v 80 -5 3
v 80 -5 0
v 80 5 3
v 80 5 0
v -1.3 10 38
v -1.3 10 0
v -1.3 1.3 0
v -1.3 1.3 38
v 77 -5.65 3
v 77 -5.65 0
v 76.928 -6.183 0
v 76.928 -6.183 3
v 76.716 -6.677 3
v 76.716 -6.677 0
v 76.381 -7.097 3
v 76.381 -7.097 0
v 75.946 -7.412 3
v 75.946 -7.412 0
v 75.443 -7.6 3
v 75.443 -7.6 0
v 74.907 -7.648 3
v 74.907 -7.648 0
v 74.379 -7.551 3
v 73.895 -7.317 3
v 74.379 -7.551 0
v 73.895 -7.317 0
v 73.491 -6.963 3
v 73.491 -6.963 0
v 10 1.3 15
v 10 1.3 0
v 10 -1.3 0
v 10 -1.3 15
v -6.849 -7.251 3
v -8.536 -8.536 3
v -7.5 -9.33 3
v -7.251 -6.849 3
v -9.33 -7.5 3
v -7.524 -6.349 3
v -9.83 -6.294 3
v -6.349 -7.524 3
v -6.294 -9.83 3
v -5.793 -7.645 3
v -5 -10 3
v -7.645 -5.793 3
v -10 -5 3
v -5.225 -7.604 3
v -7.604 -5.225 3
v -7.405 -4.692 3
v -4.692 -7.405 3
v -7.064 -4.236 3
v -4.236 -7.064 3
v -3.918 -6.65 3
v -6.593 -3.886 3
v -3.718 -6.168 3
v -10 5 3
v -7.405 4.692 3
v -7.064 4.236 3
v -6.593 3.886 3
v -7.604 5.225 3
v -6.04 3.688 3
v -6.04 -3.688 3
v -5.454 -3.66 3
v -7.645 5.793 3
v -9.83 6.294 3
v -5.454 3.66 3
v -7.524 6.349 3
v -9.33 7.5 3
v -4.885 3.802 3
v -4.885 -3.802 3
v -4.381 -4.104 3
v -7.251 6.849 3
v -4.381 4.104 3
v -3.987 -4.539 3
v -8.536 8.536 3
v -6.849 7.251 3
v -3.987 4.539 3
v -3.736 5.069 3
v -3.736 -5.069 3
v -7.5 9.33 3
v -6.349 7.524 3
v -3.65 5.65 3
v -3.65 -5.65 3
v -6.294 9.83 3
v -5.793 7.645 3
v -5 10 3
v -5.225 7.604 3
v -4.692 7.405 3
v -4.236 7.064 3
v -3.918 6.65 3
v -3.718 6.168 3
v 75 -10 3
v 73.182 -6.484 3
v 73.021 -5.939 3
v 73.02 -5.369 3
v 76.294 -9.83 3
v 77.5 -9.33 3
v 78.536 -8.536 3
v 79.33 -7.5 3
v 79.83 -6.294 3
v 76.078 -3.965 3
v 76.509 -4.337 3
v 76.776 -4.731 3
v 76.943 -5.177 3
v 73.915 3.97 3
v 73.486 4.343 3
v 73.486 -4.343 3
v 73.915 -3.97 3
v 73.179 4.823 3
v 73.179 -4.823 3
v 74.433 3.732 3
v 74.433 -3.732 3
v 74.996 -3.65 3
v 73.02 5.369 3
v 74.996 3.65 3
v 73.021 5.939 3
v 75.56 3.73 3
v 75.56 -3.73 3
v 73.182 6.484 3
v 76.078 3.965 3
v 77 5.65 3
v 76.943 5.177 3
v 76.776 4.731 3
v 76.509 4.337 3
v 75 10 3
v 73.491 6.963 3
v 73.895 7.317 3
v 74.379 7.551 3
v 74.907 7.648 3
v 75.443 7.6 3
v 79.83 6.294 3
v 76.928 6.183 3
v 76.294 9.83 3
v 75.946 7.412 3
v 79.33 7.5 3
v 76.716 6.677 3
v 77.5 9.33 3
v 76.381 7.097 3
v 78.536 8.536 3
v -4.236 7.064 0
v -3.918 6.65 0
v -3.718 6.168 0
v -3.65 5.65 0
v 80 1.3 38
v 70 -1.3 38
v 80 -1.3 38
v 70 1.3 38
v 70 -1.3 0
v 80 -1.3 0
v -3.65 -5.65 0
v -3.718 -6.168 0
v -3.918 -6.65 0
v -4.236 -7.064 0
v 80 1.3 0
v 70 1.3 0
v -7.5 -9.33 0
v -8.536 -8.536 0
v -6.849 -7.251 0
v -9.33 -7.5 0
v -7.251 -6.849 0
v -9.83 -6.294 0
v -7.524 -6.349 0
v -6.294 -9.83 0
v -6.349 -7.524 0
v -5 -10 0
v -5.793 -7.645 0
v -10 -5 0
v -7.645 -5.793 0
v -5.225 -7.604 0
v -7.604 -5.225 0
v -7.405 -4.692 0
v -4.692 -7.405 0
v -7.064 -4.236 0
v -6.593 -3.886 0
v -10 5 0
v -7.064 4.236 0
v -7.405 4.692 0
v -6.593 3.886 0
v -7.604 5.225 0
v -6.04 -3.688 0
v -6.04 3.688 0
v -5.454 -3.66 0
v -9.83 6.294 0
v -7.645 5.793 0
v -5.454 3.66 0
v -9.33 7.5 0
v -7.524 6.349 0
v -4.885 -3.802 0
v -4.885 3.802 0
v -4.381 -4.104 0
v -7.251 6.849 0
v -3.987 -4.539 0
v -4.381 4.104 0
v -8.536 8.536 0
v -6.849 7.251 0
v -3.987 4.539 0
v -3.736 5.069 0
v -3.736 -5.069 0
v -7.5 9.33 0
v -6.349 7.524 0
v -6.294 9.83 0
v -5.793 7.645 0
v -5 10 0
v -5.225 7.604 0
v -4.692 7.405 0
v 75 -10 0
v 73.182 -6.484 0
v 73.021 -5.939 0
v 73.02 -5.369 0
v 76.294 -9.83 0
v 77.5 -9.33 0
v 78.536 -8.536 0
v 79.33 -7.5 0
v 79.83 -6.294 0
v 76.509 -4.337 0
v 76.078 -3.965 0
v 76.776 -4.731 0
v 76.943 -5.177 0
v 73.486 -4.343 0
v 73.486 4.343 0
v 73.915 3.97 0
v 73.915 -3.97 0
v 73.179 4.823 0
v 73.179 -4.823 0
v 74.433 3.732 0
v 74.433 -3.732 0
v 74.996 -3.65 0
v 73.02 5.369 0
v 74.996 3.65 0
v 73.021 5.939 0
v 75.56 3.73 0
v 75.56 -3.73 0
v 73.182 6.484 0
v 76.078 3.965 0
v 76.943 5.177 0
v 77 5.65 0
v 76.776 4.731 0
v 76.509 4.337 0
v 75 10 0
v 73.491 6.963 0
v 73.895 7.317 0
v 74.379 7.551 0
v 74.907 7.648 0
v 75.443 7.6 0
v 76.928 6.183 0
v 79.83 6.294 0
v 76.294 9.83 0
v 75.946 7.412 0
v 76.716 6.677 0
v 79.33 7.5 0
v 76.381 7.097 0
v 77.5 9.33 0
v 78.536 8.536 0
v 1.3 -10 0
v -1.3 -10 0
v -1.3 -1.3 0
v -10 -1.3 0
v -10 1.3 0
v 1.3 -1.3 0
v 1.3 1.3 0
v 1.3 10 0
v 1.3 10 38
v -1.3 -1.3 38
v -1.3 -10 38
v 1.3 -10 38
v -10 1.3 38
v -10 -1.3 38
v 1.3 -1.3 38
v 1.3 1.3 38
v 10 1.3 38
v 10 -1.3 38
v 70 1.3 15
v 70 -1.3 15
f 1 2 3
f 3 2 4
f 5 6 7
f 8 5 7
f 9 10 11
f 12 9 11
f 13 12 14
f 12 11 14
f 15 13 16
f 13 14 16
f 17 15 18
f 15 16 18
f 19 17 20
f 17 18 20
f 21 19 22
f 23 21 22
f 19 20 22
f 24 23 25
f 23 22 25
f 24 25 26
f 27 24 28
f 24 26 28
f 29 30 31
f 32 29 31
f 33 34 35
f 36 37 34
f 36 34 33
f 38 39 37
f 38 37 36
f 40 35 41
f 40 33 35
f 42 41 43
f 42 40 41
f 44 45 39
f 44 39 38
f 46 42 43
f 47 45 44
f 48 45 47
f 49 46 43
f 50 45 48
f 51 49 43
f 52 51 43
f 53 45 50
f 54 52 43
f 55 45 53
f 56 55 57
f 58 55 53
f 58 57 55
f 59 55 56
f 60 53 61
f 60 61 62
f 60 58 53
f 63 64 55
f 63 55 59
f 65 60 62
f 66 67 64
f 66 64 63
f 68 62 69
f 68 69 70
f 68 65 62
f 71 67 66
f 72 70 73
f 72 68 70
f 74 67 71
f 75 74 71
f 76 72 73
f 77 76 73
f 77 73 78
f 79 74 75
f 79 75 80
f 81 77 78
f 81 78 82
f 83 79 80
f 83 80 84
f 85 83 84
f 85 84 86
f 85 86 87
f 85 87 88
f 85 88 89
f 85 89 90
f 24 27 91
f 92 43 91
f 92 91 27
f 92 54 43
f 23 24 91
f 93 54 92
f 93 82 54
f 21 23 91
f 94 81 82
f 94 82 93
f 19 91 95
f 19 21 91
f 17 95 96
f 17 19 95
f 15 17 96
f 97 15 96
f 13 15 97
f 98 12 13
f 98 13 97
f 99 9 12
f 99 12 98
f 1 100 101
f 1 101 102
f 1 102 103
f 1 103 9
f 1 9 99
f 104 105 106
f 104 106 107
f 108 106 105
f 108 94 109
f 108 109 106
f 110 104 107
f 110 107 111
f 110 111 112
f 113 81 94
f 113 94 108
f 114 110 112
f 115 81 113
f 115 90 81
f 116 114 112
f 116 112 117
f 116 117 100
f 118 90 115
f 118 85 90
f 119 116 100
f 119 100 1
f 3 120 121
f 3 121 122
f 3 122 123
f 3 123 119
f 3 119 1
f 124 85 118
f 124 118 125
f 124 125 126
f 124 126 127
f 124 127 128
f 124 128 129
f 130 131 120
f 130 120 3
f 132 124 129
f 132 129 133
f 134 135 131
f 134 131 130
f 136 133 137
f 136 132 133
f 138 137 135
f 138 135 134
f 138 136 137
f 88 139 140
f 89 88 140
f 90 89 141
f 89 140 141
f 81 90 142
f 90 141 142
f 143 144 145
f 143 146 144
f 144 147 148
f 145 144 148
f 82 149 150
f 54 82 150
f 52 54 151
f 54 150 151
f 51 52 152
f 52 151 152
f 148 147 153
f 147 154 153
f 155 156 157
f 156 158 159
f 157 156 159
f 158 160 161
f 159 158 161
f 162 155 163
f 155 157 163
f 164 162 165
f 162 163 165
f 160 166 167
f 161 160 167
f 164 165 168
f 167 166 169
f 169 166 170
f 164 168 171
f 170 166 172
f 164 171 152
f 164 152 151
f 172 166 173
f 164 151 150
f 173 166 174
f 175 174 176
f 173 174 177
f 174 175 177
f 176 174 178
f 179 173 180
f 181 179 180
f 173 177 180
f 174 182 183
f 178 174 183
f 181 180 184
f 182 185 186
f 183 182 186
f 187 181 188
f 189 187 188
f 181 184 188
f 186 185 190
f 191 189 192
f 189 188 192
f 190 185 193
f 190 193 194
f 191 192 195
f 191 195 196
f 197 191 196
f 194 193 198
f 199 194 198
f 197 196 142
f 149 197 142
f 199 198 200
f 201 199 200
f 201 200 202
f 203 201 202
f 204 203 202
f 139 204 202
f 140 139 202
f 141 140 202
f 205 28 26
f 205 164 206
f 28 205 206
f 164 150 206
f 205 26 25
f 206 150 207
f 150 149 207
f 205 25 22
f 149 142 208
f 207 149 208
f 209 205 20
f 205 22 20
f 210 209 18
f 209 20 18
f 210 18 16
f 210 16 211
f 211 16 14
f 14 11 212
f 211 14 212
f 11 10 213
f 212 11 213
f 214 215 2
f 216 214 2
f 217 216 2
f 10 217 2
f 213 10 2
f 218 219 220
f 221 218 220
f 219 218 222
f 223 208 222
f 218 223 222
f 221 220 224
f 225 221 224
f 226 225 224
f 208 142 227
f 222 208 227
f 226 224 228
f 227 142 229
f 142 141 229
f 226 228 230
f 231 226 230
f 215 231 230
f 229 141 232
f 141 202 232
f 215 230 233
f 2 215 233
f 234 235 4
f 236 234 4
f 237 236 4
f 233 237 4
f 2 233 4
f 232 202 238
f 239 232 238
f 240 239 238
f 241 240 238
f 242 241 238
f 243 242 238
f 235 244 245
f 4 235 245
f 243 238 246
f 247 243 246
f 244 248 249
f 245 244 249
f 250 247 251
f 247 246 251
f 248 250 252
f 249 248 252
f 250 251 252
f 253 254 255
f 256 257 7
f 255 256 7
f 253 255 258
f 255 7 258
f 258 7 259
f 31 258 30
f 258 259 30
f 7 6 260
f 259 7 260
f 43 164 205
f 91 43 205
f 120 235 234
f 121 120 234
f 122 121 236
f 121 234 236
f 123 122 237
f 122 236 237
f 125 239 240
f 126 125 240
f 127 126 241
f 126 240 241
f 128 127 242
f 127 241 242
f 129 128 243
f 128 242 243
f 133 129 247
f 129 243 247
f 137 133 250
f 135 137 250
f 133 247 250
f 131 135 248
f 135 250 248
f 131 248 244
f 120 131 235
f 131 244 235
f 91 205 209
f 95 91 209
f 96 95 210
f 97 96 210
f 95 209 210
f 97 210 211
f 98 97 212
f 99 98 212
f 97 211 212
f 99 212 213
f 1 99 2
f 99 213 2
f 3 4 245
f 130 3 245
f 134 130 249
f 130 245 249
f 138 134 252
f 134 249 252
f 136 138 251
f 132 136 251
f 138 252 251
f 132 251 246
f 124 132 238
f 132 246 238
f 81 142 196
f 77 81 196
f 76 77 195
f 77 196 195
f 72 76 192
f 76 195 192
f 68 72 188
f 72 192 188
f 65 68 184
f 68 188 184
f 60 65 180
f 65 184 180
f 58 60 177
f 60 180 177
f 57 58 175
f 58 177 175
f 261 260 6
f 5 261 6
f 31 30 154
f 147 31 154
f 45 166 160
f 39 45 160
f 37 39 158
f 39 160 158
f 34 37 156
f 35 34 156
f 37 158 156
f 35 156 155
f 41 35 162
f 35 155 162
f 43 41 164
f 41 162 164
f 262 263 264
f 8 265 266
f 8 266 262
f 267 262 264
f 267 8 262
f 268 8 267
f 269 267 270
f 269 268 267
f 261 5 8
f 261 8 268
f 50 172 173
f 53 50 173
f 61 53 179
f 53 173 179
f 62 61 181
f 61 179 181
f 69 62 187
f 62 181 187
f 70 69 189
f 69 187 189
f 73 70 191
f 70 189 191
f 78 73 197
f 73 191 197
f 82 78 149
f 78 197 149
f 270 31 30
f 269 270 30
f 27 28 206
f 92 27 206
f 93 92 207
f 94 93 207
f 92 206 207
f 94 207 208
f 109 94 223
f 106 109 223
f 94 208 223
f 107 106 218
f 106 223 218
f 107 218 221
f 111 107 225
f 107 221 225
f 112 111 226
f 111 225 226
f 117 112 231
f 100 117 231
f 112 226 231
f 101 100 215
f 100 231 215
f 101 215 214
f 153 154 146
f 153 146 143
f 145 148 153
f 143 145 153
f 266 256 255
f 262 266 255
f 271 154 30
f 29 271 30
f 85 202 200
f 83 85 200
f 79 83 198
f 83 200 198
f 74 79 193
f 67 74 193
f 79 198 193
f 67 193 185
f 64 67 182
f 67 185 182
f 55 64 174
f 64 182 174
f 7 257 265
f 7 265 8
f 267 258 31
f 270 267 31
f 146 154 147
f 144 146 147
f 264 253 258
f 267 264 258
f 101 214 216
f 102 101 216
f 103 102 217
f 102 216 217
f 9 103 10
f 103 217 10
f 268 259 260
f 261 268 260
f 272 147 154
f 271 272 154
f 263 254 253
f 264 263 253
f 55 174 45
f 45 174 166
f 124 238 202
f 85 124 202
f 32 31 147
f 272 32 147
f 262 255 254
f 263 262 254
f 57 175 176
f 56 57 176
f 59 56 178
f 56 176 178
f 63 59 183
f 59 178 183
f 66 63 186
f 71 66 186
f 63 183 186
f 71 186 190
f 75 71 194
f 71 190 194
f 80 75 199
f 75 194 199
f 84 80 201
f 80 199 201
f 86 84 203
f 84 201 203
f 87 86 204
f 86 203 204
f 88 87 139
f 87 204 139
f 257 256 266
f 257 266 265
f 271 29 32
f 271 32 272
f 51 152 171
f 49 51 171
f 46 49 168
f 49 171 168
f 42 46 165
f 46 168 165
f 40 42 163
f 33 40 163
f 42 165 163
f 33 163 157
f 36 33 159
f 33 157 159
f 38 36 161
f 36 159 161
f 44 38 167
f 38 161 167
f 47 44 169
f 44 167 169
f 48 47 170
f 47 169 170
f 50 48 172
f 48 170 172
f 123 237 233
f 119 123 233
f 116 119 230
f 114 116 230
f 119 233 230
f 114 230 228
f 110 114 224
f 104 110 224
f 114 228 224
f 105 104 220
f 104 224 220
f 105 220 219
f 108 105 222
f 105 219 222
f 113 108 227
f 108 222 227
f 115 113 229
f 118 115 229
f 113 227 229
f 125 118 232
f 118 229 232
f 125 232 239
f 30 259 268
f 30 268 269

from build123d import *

# Parameters (mm, degrees)
F0_W     = 10
F0_H     = 1.3
F1_DEPTH = 38
F0_W_2   = 8.7
F0_H_2   = 2.6
F0_W_3   = 1.3
F0_W_4   = 18
F2_DEPTH = 3
F3_DEPTH = 15


with BuildPart() as f1:
    # F0 (on Top) → F1 (new body)
    with BuildSketch(Plane.XY):
        with Locations((75, -0.65)):
            Rectangle(F0_W, F0_H)
        with Locations((75, 0.65)):
            Rectangle(F0_W, F0_H)
    extrude(amount=F1_DEPTH)


with BuildPart() as f1b:
    # F0 (on Top) → F1, piece 2 (new body)
    with BuildSketch(Plane.XY):
        Polygon((0, 1.3), (1.3, 1.3), (1.3, 10), (-1.3, 10), (-1.3, 1.3), align=None)
        with Locations((-5.65, 0)):
            Rectangle(F0_W_2, F0_H_2)
        Polygon((1.3, -10), (1.3, -1.3), (0, -1.3), (-1.3, -1.3), (-1.3, -10), align=None)
        with Locations((5.65, -0.65)):
            Rectangle(F0_W_2, F0_H)
        with Locations((5.65, 0.65)):
            Rectangle(F0_W_2, F0_H)
        with Locations((0.65, -0.65)):
            Rectangle(F0_W_3, F0_H)
        with Locations((0.65, 0.65)):
            Rectangle(F0_W_3, F0_H)
        Polygon((0, 0), (0, 1.3), (-1.3, 1.3), (-1.3, -1.3), (0, -1.3), align=None)
    extrude(amount=F1_DEPTH)


with BuildPart() as f2:
    # F0 (on Top) → F2 (new body)
    with BuildSketch(Plane.XY):
        with BuildLine():
            Line((-7.0642135624, -4.2357864376), (-10, -1.3))
            Line((-10, -1.3), (-10, -5))
            ThreePointArc((-10, -5), (-8.5355339059, -8.5355339059), (-5, -10))
            Line((-5, -10), (-1.3, -10))
            Line((-1.3, -10), (-4.2357864376, -7.0642135624))
            ThreePointArc((-4.2357864376, -7.0642135624), (-7.0642135624, -7.0642135624), (-7.0642135624, -4.2357864376))
        make_face()
        with BuildLine():
            ThreePointArc((35.65, -3.3), (18.151339337, -4.9906352574), (1.3, -10))
            Line((1.3, -10), (70, -10))
            ThreePointArc((70, -10), (53.148660663, -4.9906352574), (35.65, -3.3))
        make_face()
        with BuildLine():
            Line((-4.2357864376, 7.0642135624), (-1.3, 10))
            Line((-1.3, 10), (-5, 10))
            ThreePointArc((-5, 10), (-8.5355339059, 8.5355339059), (-10, 5))
            Line((-10, 5), (-10, 1.3))
            Line((-10, 1.3), (-7.0642135624, 4.2357864376))
            ThreePointArc((-7.0642135624, 4.2357864376), (-7.0642135624, 7.0642135624), (-4.2357864376, 7.0642135624))
        make_face()
        with BuildLine():
            Line((70, 10), (1.3, 10))
            ThreePointArc((1.3, 10), (18.151339337, 4.9906352574), (35.65, 3.3))
            ThreePointArc((35.65, 3.3), (53.148660663, 4.9906352574), (70, 10))
        make_face()
        with Locations((-5.65, 0)):
            Rectangle(F0_W_2, F0_H_2)
        with Locations((75, 0.65)):
            Rectangle(F0_W, F0_H)
        with Locations((75, -0.65)):
            Rectangle(F0_W, F0_H)
        with BuildLine():
            Line((73.4911138428, -6.9627309567), (70, -10))
            Line((70, -10), (75, -10))
            ThreePointArc((75, -10), (78.5355339059, -8.5355339059), (80, -5))
            Line((80, -5), (80, -1.3))
            Line((80, -1.3), (76.5088861572, -4.3372690433))
            ThreePointArc((76.5088861572, -4.3372690433), (76.8732021133, -4.9492048496), (77, -5.65))
            ThreePointArc((77, -5.65), (75.7007951504, -7.5232021133), (73.4911138428, -6.9627309567))
        make_face()
        with BuildLine():
            Line((75, 10), (70, 10))
            Line((70, 10), (73.4911138428, 6.9627309567))
            ThreePointArc((73.4911138428, 6.9627309567), (75.7007951504, 7.5232021133), (77, 5.65))
            ThreePointArc((77, 5.65), (76.8732021133, 4.9492048496), (76.5088861572, 4.3372690433))
            Line((76.5088861572, 4.3372690433), (80, 1.3))
            Line((80, 1.3), (80, 5))
            ThreePointArc((80, 5), (78.5355339059, 8.5355339059), (75, 10))
        make_face()
        Polygon((0, 1.3), (1.3, 1.3), (1.3, 10), (-1.3, 10), (-1.3, 1.3), align=None)
        with BuildLine():
            Line((-10, 1.3), (-1.3, 1.3))
            Line((-1.3, 1.3), (-1.3, 10))
            Line((-1.3, 10), (-4.2357864376, 7.0642135624))
            ThreePointArc((-4.2357864376, 7.0642135624), (-3.802240935, 6.4153668647), (-3.65, 5.65))
            ThreePointArc((-3.65, 5.65), (-4.8846331353, 3.802240935), (-7.0642135624, 4.2357864376))
            Line((-7.0642135624, 4.2357864376), (-10, 1.3))
        make_face()
        Polygon((1.3, -10), (1.3, -1.3), (0, -1.3), (-1.3, -1.3), (-1.3, -10), align=None)
        with BuildLine():
            Line((-1.3, -10), (-1.3, -1.3))
            Line((-1.3, -1.3), (-10, -1.3))
            Line((-10, -1.3), (-7.0642135624, -4.2357864376))
            ThreePointArc((-7.0642135624, -4.2357864376), (-4.8846331353, -3.802240935), (-3.65, -5.65))
            ThreePointArc((-3.65, -5.65), (-3.802240935, -6.4153668647), (-4.2357864376, -7.0642135624))
            Line((-4.2357864376, -7.0642135624), (-1.3, -10))
        make_face()
        with BuildLine():
            Line((73.4911138428, 6.9627309567), (70, 10))
            Line((70, 10), (70, 1.3))
            Line((70, 1.3), (80, 1.3))
            Line((80, 1.3), (76.5088861572, 4.3372690433))
            ThreePointArc((76.5088861572, 4.3372690433), (73.6872690433, 4.1411138428), (73.4911138428, 6.9627309567))
        make_face()
        with BuildLine():
            Line((80, -1.3), (70, -1.3))
            Line((70, -1.3), (70, -10))
            Line((70, -10), (73.4911138428, -6.9627309567))
            ThreePointArc((73.4911138428, -6.9627309567), (73.6872690433, -4.1411138428), (76.5088861572, -4.3372690433))
            Line((76.5088861572, -4.3372690433), (80, -1.3))
        make_face()
        with BuildLine():
            Line((35.65, -1.3), (10, -1.3))
            Line((10, -1.3), (1.3, -1.3))
            Line((1.3, -1.3), (1.3, -10))
            ThreePointArc((1.3, -10), (18.151339337, -4.9906352574), (35.65, -3.3))
            Line((35.65, -3.3), (35.65, -1.3))
        make_face()
        with BuildLine():
            Line((35.65, 3.3), (35.65, 1.3))
            Line((35.65, 1.3), (52, 1.3))
            Line((52, 1.3), (70, 1.3))
            Line((70, 1.3), (70, 10))
            ThreePointArc((70, 10), (53.148660663, 4.9906352574), (35.65, 3.3))
        make_face()
        with BuildLine():
            Line((1.3, 1.3), (10, 1.3))
            Line((10, 1.3), (35.65, 1.3))
            Line((35.65, 1.3), (35.65, 3.3))
            ThreePointArc((35.65, 3.3), (18.151339337, 4.9906352574), (1.3, 10))
            Line((1.3, 10), (1.3, 1.3))
        make_face()
        Polygon((35.65, 1.3), (10, 1.3), (10, 0), (52, 0), (52, 1.3), align=None)
        Polygon((52, 0), (10, 0), (10, -1.3), (35.65, -1.3), (52, -1.3), align=None)
        with Locations((61, 0.65)):
            Rectangle(F0_W_4, F0_H)
        with Locations((5.65, 0.65)):
            Rectangle(F0_W_2, F0_H)
        with Locations((5.65, -0.65)):
            Rectangle(F0_W_2, F0_H)
        with Locations((0.65, -0.65)):
            Rectangle(F0_W_3, F0_H)
        Polygon((0, 0), (0, 1.3), (-1.3, 1.3), (-1.3, -1.3), (0, -1.3), align=None)
        with Locations((0.65, 0.65)):
            Rectangle(F0_W_3, F0_H)
        with Locations((61, -0.65)):
            Rectangle(F0_W_4, F0_H)
        with BuildLine():
            Line((52, -1.3), (35.65, -1.3))
            Line((35.65, -1.3), (35.65, -3.3))
            ThreePointArc((35.65, -3.3), (53.148660663, -4.9906352574), (70, -10))
            Line((70, -10), (70, -1.3))
            Line((70, -1.3), (52, -1.3))
        make_face()
    extrude(amount=F2_DEPTH)


with BuildPart() as f3:
    # F0 (on Top) → F3 (new body)
    with BuildSketch(Plane.XY):
        Polygon((35.65, 1.3), (10, 1.3), (10, 0), (52, 0), (52, 1.3), align=None)
        Polygon((52, 0), (10, 0), (10, -1.3), (35.65, -1.3), (52, -1.3), align=None)
        with Locations((61, 0.65)):
            Rectangle(F0_W_4, F0_H)
        with Locations((61, -0.65)):
            Rectangle(F0_W_4, F0_H)
    extrude(amount=F3_DEPTH)


solid = Compound([f1.part, f1b.part, f2.part, f3.part])
